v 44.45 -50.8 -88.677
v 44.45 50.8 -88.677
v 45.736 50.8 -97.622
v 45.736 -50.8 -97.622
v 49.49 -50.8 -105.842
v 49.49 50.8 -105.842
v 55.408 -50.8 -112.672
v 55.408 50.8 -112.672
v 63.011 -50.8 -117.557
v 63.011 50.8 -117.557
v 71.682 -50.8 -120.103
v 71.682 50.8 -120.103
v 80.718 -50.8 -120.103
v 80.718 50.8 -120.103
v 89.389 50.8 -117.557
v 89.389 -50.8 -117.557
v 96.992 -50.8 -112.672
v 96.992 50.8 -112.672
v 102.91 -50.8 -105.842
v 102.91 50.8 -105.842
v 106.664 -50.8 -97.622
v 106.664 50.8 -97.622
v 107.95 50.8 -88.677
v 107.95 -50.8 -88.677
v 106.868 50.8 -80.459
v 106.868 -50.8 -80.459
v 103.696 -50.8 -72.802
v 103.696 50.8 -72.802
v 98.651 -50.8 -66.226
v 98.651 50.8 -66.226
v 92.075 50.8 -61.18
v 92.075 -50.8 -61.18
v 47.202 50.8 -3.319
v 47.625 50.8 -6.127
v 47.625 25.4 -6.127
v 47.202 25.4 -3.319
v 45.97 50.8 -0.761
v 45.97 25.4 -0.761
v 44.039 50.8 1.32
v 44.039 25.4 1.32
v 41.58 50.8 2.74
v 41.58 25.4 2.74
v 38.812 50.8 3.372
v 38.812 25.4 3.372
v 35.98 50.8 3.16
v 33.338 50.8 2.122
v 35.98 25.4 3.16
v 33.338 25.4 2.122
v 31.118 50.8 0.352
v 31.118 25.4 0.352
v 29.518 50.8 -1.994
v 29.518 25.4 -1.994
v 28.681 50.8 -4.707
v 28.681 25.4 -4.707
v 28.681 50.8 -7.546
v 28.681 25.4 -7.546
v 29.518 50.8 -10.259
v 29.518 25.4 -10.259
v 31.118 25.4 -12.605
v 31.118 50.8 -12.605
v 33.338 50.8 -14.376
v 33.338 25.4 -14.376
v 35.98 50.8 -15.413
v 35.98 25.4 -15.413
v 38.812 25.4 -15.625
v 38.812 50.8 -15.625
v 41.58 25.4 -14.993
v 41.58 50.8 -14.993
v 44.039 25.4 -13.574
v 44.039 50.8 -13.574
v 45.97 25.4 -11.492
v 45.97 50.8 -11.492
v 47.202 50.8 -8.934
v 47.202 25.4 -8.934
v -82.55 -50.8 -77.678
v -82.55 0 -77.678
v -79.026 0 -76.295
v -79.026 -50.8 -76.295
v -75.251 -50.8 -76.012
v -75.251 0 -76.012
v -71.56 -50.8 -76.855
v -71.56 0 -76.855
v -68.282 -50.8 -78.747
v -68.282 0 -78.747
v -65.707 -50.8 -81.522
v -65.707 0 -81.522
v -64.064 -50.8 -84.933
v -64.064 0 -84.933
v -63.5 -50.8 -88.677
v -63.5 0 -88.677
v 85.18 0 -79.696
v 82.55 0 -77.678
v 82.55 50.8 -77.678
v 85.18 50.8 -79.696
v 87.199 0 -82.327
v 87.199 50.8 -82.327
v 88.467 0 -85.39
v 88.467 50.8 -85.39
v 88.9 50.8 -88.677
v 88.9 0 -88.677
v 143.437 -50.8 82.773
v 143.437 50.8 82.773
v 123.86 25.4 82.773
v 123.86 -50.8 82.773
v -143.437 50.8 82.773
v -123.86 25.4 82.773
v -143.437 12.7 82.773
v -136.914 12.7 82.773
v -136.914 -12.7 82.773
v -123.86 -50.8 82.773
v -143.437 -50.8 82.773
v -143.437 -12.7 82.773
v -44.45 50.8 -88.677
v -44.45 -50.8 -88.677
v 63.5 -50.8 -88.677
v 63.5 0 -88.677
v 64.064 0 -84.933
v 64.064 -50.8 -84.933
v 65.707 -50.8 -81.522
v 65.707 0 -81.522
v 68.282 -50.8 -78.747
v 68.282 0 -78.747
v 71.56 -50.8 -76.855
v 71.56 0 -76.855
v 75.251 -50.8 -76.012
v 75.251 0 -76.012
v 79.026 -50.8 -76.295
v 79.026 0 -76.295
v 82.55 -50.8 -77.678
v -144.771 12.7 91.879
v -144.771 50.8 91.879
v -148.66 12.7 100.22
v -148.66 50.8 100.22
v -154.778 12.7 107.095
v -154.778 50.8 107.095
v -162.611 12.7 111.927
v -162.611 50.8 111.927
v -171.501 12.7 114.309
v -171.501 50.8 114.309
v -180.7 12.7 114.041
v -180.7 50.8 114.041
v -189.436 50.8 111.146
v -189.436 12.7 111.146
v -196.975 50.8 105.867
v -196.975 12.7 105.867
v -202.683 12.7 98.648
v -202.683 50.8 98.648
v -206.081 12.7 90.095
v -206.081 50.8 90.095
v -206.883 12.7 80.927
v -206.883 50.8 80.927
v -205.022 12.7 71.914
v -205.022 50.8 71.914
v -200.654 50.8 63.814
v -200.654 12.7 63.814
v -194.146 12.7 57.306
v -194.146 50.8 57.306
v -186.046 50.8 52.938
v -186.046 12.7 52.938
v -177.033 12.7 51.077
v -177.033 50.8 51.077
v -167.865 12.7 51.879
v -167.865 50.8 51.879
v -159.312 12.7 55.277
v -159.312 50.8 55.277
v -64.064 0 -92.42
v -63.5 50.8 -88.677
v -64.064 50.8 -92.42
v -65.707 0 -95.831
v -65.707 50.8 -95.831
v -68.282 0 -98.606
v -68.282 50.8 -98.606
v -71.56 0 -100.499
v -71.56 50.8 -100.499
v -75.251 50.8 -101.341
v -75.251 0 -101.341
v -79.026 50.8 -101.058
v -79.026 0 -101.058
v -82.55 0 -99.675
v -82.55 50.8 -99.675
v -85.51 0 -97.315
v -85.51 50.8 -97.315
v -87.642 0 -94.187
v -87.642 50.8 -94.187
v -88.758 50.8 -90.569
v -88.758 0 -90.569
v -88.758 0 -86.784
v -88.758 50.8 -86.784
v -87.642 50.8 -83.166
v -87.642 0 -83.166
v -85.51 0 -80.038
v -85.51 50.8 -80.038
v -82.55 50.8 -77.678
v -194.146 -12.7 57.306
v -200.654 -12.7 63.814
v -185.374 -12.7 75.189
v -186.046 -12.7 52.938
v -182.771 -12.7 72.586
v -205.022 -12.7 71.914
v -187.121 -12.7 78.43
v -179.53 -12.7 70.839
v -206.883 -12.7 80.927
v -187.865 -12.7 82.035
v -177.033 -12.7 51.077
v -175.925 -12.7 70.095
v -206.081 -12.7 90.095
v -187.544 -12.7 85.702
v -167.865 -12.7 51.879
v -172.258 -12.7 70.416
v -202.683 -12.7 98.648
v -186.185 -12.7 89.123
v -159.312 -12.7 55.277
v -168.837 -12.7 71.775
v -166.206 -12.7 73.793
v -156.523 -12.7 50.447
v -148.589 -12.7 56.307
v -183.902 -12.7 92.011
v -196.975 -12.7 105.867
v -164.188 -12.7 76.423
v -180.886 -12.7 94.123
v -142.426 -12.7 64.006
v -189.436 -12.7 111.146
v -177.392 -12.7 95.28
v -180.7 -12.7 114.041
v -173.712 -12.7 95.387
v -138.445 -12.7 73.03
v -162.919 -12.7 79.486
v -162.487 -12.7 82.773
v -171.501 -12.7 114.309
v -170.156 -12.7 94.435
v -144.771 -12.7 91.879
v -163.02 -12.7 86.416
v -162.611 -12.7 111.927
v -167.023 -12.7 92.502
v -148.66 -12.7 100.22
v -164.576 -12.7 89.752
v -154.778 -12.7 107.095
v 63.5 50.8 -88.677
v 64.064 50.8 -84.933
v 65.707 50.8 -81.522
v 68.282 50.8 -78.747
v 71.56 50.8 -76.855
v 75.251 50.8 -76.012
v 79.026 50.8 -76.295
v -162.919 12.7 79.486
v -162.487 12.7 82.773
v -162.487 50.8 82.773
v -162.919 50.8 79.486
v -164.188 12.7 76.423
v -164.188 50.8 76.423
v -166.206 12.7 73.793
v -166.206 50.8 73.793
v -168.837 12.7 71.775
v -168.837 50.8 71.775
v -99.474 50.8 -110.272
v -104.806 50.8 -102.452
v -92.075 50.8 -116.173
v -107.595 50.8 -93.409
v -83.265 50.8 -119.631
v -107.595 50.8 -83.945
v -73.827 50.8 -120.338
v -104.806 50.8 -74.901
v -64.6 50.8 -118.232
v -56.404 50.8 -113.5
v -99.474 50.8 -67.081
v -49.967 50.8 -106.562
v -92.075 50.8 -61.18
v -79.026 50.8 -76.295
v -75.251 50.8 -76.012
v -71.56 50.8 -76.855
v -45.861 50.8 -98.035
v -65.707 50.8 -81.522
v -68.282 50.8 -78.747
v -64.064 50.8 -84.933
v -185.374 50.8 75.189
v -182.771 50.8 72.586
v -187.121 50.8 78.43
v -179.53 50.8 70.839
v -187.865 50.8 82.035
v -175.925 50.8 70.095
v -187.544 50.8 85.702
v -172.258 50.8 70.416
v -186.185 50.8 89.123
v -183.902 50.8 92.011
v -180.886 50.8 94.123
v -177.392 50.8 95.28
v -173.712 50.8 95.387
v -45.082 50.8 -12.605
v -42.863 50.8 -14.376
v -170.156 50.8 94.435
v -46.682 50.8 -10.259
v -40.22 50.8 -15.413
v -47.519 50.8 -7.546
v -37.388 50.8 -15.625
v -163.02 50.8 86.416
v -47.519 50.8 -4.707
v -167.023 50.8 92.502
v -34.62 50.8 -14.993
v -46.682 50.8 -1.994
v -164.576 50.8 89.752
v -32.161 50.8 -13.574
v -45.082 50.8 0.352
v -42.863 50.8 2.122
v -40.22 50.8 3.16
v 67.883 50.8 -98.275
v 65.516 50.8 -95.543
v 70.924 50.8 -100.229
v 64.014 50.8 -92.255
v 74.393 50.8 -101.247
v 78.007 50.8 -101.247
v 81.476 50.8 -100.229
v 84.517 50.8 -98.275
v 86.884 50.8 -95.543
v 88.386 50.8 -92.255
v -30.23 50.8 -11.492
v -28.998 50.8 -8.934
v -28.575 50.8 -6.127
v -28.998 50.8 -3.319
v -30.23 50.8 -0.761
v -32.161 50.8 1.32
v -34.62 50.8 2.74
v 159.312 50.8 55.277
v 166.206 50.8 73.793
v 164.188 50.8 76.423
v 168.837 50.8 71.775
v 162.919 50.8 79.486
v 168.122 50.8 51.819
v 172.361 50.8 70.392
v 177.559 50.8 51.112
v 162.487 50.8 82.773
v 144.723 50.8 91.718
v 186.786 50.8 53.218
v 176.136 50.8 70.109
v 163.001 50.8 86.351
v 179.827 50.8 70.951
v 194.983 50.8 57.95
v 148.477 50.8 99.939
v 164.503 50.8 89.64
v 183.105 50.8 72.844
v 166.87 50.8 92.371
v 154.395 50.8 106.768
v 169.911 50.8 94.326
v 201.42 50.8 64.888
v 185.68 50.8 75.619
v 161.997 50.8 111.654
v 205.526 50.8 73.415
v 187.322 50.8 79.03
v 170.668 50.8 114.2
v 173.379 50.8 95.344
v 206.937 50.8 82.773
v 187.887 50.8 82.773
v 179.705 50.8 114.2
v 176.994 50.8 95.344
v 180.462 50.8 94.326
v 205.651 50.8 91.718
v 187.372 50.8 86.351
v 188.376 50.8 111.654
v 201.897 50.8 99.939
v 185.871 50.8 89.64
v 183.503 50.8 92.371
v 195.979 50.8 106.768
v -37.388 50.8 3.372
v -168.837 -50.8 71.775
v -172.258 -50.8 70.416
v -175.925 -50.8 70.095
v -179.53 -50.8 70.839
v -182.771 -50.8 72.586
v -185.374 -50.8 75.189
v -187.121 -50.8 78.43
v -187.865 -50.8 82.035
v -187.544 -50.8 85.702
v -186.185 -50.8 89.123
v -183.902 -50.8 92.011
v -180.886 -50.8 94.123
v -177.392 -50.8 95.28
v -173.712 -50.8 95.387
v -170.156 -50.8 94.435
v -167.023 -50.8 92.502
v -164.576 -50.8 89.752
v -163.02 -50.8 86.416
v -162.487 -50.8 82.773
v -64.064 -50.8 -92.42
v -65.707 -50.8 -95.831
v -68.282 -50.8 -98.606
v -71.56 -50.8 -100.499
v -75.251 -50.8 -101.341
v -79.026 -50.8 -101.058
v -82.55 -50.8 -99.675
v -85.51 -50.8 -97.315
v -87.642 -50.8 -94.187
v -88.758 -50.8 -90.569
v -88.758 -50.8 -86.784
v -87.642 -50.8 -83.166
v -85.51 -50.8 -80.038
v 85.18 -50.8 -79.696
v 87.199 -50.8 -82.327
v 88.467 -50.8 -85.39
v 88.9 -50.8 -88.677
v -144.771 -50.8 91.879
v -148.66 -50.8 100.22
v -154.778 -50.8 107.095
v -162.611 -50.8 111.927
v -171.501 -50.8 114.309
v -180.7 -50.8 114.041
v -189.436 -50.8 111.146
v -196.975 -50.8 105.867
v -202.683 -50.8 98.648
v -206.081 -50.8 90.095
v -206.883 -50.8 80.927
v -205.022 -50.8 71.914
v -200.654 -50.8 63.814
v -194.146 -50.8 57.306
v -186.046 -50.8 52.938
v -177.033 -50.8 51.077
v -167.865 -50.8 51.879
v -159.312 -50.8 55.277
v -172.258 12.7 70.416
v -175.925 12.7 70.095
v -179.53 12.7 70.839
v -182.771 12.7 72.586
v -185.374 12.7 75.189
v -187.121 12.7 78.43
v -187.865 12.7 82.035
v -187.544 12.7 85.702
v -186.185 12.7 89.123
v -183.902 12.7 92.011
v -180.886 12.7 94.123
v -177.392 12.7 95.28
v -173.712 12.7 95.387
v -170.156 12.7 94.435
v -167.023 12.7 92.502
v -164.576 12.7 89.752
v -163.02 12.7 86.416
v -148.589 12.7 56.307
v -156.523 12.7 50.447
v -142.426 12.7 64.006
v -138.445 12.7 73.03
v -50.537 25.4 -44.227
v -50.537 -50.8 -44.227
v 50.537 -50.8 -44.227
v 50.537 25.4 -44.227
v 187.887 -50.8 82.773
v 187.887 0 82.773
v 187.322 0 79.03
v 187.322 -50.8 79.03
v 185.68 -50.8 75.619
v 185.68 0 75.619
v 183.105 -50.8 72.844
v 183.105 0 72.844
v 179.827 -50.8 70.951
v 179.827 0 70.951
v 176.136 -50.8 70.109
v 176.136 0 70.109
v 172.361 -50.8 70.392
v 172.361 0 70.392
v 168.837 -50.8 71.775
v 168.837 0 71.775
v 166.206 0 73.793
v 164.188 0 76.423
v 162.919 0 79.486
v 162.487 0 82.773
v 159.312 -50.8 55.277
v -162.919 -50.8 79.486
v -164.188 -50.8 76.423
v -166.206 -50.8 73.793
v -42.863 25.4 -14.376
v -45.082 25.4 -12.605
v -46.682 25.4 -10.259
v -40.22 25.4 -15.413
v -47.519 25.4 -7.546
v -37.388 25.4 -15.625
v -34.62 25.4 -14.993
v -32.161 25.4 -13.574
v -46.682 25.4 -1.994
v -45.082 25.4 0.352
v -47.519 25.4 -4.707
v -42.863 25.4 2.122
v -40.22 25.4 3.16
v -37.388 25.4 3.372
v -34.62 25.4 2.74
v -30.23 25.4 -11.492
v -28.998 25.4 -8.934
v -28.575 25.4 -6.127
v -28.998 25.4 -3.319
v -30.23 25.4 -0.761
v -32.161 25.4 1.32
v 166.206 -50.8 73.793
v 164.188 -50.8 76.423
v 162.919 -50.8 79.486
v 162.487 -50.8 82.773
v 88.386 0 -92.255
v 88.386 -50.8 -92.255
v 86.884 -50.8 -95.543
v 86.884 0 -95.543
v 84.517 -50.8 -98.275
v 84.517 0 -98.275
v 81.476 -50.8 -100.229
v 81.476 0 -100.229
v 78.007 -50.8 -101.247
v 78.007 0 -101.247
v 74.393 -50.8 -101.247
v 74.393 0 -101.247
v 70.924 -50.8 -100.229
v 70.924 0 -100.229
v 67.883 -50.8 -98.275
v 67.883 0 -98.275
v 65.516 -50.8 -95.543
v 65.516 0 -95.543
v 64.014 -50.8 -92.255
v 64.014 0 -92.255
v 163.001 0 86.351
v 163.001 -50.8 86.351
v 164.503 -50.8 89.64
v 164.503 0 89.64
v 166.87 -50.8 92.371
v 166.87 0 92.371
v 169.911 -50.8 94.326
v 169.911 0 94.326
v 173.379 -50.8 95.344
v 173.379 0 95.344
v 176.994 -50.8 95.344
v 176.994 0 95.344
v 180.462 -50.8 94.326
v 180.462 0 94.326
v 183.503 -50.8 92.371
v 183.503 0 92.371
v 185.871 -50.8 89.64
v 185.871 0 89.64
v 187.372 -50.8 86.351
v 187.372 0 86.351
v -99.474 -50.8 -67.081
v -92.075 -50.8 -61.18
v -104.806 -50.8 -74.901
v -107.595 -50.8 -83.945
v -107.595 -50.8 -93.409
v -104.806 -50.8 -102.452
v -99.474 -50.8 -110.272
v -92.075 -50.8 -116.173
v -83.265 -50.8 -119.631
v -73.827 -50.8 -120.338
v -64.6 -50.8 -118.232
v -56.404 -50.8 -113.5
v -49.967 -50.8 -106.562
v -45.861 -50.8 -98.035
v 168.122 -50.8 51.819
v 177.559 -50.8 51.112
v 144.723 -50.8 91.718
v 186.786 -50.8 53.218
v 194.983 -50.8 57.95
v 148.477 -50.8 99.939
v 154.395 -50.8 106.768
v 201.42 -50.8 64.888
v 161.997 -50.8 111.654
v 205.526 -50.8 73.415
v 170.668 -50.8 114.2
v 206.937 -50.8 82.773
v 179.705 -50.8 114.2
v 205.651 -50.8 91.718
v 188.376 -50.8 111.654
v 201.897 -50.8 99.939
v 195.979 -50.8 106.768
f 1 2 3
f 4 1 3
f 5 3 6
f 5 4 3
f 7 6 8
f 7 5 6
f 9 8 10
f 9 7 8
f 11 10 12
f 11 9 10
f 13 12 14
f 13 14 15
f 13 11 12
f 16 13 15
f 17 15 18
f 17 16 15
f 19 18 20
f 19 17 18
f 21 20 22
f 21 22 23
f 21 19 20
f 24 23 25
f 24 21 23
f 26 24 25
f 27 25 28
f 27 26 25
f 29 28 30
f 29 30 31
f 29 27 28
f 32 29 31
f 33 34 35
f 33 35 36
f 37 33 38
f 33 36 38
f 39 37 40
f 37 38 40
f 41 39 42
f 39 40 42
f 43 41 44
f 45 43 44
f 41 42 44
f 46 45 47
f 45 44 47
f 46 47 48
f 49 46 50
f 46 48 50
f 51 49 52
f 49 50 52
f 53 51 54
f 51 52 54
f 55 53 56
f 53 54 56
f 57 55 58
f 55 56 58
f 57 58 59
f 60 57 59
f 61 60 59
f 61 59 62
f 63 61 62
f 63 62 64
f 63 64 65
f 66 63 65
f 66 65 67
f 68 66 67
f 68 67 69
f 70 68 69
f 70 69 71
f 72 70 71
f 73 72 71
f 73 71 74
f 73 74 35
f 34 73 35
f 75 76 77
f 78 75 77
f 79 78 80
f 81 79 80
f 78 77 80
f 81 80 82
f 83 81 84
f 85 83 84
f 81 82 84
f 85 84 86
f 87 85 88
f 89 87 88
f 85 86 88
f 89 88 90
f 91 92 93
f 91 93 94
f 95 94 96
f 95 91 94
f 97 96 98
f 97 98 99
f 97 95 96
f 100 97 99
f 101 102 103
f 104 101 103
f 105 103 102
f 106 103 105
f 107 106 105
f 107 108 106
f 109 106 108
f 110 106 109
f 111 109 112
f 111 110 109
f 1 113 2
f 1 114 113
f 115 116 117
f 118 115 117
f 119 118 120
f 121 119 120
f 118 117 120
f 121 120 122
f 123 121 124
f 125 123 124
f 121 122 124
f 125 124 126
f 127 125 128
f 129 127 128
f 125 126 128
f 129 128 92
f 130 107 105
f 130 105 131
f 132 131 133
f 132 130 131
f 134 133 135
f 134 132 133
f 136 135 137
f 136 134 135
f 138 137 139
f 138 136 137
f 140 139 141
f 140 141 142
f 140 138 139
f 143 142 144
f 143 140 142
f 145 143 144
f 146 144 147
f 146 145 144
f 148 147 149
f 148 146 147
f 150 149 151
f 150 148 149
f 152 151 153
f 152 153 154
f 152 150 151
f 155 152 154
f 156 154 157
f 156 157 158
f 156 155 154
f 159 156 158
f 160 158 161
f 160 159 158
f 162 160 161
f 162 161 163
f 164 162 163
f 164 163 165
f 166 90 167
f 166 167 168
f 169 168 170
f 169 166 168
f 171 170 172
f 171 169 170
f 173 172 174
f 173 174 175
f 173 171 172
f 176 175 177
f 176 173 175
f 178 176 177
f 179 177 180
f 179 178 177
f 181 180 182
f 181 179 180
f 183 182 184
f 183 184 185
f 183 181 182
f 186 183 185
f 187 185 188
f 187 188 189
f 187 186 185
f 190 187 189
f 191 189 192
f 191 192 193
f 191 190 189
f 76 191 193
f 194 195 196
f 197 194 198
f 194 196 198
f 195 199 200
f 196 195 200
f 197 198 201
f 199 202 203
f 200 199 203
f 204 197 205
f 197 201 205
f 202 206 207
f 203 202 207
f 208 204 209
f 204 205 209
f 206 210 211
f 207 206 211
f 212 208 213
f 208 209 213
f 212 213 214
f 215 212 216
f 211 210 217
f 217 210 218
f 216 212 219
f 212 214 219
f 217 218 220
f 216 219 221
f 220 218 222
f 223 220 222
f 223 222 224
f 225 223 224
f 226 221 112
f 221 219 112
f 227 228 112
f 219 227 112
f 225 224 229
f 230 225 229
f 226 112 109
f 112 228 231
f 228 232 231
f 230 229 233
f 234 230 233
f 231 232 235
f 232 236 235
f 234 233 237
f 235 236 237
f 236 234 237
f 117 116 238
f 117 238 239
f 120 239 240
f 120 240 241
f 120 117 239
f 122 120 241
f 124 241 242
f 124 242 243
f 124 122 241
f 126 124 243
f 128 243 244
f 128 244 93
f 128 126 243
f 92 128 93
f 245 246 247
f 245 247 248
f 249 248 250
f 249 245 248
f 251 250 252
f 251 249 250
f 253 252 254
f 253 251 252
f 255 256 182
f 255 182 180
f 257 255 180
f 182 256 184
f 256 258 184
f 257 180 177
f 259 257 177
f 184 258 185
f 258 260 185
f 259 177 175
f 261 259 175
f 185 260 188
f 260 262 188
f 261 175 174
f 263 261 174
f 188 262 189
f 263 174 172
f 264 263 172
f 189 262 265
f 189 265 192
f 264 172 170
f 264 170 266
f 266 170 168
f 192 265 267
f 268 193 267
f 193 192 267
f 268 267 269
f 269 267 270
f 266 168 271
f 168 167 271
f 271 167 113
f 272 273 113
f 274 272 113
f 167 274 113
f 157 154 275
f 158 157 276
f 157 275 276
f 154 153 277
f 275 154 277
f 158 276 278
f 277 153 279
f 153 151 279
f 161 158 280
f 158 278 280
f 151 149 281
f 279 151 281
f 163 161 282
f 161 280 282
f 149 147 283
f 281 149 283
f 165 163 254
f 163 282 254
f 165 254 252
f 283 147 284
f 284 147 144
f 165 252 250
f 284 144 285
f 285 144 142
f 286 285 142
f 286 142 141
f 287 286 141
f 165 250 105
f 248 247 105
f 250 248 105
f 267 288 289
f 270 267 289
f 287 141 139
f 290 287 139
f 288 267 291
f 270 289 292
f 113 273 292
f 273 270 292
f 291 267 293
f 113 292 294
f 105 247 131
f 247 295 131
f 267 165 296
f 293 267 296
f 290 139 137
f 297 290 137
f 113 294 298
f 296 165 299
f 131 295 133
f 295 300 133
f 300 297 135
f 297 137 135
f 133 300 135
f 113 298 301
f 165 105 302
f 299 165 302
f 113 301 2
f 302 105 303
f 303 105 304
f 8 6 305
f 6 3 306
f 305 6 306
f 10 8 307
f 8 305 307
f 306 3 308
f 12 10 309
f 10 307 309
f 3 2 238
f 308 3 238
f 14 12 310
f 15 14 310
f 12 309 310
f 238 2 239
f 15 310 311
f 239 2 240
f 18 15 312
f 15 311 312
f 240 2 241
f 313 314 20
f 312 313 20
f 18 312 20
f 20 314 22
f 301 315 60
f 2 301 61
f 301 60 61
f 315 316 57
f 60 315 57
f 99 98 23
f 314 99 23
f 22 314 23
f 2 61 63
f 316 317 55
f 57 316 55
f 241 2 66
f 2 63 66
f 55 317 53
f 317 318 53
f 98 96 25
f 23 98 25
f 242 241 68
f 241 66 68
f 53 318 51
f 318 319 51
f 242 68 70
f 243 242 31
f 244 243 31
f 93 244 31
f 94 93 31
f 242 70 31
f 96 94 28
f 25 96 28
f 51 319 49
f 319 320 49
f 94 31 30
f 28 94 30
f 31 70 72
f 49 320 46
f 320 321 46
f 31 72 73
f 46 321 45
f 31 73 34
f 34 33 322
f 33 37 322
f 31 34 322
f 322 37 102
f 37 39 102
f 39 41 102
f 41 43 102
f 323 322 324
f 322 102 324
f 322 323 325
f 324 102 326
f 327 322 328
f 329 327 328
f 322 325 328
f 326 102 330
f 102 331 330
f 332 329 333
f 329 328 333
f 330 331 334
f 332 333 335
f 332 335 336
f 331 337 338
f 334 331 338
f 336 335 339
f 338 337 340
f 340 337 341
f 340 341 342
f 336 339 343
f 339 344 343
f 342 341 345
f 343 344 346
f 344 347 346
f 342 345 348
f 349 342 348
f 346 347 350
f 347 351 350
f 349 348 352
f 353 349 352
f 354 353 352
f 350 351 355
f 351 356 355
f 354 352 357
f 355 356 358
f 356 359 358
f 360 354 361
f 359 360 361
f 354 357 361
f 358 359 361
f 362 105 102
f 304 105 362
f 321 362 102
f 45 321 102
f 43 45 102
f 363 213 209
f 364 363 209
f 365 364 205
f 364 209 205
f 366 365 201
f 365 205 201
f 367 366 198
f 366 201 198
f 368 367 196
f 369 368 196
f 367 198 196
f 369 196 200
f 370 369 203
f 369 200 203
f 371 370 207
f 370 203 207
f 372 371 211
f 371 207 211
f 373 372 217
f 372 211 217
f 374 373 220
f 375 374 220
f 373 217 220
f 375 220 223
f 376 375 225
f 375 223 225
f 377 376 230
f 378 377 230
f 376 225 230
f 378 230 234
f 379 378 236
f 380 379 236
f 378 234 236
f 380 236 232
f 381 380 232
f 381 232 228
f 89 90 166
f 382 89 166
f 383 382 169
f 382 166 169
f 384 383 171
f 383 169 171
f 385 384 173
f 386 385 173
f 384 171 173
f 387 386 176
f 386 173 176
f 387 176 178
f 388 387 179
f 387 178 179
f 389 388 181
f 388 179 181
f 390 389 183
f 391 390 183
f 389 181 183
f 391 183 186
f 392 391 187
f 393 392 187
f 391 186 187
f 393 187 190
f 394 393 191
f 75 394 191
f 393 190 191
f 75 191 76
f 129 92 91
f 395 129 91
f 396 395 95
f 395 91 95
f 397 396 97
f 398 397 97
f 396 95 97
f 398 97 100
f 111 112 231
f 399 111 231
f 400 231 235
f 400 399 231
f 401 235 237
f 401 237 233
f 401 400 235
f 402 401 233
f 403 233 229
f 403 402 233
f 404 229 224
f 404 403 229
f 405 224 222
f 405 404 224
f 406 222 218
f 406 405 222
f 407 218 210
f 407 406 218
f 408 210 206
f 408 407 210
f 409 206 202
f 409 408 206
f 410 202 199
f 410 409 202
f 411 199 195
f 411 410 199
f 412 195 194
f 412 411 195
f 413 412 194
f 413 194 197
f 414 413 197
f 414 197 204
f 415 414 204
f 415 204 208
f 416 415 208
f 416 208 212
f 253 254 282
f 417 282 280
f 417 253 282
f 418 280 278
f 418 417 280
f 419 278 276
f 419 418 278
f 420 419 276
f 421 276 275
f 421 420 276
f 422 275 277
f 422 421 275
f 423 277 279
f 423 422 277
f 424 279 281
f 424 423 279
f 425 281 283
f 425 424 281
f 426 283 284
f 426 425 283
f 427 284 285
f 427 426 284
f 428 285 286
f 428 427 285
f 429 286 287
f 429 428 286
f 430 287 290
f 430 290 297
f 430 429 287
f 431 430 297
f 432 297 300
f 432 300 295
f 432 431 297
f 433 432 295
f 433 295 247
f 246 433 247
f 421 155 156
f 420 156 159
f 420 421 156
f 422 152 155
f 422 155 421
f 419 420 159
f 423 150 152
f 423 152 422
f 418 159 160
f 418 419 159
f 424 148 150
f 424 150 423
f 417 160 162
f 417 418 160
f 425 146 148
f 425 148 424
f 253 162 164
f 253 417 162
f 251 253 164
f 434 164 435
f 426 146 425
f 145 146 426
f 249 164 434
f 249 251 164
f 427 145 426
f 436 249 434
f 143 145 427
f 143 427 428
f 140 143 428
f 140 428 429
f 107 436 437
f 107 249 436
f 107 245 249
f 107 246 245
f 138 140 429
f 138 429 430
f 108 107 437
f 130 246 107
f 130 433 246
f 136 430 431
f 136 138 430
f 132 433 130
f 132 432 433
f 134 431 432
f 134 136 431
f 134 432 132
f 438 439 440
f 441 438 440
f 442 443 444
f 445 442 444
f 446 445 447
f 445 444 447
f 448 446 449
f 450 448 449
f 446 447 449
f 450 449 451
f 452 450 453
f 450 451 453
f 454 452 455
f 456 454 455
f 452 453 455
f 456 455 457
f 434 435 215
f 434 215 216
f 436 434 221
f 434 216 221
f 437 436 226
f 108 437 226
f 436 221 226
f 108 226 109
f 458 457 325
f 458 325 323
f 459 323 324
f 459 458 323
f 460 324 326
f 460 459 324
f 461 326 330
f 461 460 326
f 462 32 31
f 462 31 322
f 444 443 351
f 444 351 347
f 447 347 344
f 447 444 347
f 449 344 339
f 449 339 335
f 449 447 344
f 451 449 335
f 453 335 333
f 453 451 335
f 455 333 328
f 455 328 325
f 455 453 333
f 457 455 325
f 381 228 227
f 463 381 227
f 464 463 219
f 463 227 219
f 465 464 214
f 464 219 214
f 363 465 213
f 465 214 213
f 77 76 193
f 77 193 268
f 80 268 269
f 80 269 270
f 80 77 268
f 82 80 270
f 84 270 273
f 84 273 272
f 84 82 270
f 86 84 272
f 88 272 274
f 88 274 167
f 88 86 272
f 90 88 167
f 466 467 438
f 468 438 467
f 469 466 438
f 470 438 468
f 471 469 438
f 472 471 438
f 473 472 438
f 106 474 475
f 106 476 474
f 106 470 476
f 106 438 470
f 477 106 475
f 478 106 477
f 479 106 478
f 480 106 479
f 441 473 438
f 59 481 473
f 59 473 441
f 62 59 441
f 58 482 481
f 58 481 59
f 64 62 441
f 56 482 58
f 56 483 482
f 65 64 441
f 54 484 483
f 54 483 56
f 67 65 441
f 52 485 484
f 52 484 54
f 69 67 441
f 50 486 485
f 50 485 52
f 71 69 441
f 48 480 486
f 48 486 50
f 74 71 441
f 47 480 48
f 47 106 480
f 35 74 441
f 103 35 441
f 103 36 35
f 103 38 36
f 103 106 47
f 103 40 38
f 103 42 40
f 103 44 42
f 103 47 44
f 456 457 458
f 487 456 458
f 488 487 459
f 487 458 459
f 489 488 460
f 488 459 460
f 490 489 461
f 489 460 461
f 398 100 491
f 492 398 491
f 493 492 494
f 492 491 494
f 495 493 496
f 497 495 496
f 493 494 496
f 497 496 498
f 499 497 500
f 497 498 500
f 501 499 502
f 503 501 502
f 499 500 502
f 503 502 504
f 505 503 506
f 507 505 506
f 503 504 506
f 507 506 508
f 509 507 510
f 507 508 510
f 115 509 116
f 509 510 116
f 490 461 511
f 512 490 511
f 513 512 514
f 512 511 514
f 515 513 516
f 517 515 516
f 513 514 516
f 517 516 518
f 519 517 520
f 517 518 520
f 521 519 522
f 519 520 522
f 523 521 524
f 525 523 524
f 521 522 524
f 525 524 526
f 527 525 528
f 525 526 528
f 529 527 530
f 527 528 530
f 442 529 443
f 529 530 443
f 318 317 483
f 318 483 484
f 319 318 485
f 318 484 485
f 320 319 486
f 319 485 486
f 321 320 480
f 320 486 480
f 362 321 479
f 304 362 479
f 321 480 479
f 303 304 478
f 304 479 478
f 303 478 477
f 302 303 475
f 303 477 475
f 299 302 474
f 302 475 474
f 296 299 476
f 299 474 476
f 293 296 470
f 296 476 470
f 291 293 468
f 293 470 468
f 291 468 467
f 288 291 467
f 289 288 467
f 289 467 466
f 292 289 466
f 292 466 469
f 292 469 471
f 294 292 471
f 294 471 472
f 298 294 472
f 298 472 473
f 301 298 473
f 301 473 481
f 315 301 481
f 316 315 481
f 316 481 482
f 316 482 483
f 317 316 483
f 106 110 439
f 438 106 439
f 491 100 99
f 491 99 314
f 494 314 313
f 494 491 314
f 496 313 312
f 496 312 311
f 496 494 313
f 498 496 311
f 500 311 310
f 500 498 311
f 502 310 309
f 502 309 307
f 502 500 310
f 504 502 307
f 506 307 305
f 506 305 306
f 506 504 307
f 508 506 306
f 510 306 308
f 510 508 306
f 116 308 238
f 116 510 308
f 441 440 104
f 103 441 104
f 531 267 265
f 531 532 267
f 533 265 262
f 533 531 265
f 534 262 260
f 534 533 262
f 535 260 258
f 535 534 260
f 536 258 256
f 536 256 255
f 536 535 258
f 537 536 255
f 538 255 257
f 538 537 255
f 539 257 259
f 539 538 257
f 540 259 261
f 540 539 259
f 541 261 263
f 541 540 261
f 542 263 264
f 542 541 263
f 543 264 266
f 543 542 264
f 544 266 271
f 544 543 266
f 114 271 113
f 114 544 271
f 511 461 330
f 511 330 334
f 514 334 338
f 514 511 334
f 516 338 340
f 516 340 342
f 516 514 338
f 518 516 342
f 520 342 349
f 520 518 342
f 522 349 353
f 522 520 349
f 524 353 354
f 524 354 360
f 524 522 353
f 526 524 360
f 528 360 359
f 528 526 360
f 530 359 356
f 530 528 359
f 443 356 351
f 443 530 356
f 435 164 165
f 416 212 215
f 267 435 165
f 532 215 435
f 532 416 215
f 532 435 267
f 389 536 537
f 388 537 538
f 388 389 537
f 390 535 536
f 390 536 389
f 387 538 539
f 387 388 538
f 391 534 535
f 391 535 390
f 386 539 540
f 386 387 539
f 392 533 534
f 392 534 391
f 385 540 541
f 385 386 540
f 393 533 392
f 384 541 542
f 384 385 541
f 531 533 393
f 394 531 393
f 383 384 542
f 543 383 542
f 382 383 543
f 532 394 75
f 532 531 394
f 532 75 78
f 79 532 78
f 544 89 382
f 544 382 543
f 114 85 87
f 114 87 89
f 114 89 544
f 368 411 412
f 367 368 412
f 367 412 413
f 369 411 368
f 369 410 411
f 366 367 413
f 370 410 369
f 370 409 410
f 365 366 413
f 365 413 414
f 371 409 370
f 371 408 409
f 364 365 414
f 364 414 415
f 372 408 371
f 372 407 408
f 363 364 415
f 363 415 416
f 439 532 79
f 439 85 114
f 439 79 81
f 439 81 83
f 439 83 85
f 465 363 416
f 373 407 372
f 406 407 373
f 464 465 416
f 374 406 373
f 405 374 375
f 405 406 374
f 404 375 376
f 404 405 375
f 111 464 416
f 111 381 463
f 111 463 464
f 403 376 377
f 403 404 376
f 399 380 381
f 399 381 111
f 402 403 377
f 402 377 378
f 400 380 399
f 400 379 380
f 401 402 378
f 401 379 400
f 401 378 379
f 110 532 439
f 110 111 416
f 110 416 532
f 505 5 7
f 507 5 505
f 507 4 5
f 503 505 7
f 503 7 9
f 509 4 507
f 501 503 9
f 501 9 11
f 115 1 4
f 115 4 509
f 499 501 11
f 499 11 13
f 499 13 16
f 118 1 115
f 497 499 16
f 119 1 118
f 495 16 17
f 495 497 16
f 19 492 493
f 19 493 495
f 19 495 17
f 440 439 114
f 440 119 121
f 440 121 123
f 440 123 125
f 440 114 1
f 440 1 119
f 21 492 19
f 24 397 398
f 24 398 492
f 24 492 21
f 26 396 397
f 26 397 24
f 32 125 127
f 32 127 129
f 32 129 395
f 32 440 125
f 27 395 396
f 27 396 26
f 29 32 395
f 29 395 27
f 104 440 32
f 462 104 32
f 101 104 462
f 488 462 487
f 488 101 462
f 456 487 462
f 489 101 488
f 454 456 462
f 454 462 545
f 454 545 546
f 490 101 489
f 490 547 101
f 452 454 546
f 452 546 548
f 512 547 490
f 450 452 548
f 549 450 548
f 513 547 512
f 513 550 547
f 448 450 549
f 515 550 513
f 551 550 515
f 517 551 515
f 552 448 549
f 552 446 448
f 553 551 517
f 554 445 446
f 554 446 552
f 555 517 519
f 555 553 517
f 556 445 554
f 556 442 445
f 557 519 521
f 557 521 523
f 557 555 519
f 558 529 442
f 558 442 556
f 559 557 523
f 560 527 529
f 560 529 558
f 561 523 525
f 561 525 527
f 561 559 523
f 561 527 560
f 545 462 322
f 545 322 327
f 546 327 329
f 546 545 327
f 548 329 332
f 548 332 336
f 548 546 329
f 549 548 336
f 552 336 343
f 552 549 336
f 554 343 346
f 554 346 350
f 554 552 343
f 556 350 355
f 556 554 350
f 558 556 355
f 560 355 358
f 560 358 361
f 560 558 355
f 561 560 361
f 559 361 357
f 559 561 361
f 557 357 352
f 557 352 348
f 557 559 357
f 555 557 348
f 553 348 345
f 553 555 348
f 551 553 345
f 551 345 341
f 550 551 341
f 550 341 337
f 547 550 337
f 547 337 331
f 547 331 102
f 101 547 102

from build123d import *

# Parameters (mm, degrees)
F1_DEPTH = 50.8
F3_DEPTH = 76.2
F4_R     = 38.1
F5_DEPTH = 12.7
F6_R     = 9.525
F7_DEPTH = 25.401


with BuildPart() as f1:
    # F0 (on Front) → F1 (new body, symmetric)
    with BuildSketch(Plane.XZ):
        with BuildLine():
            ThreePointArc((-92.075, -61.1803239805), (-60.325, -61.1803239805), (-44.45, -88.6766305507))
            Line((-44.45, -88.6766305507), (44.45, -88.6766305507))
            ThreePointArc((44.45, -88.6766305507), (60.325, -61.1803239805), (92.075, -61.1803239805))
            Line((92.075, -61.1803239805), (159.3117036526, 55.2770628791))
            ThreePointArc((159.3117036526, 55.2770628791), (147.6903970824, 66.8983694493), (143.4367036526, 82.7733694493))
            Line((143.4367036526, 82.7733694493), (-143.4367036526, 82.7733694493))
            ThreePointArc((-143.4367036526, 82.7733694493), (-147.6903970824, 66.8983694493), (-159.3117036526, 55.2770628791))
            Line((-159.3117036526, 55.2770628791), (-92.075, -61.1803239805))
        make_face()
        with BuildLine():
            Line((-168.8367036526, 71.7748468212), (-159.3117036526, 55.2770628791))
            ThreePointArc((-159.3117036526, 55.2770628791), (-147.6903970824, 66.8983694493), (-143.4367036526, 82.7733694493))
            Line((-143.4367036526, 82.7733694493), (-162.4867036526, 82.7733694493))
            ThreePointArc((-162.4867036526, 82.7733694493), (-164.1881810245, 76.4233694493), (-168.8367036526, 71.7748468212))
        make_face()
        with BuildLine():
            ThreePointArc((-143.4367036526, 82.7733694493), (-202.6830102227, 98.6483694493), (-159.3117036526, 55.2770628791))
            Line((-159.3117036526, 55.2770628791), (-168.8367036526, 71.7748468212))
            ThreePointArc((-168.8367036526, 71.7748468212), (-186.1852262806, 89.1233694493), (-162.4867036526, 82.7733694493))
            Line((-162.4867036526, 82.7733694493), (-143.4367036526, 82.7733694493))
        make_face()
        with BuildLine():
            Line((168.8367036526, 71.7748468212), (159.3117036526, 55.2770628791))
            ThreePointArc((159.3117036526, 55.2770628791), (191.0617036526, 55.2770628791), (206.9367036526, 82.7733694493))
            ThreePointArc((206.9367036526, 82.7733694493), (175.1867036526, 114.5233694493), (143.4367036526, 82.7733694493))
            Line((143.4367036526, 82.7733694493), (162.4867036526, 82.7733694493))
            ThreePointArc((162.4867036526, 82.7733694493), (175.1867036526, 95.4733694493), (187.8867036526, 82.7733694493))
            ThreePointArc((187.8867036526, 82.7733694493), (181.5367036526, 71.7748468212), (168.8367036526, 71.7748468212))
        make_face()
        with BuildLine():
            ThreePointArc((143.4367036526, 82.7733694493), (147.6903970824, 66.8983694493), (159.3117036526, 55.2770628791))
            Line((159.3117036526, 55.2770628791), (168.8367036526, 71.7748468212))
            ThreePointArc((168.8367036526, 71.7748468212), (164.1881810245, 76.4233694493), (162.4867036526, 82.7733694493))
            Line((162.4867036526, 82.7733694493), (143.4367036526, 82.7733694493))
        make_face()
        with BuildLine():
            Line((63.5, -88.6766305507), (44.45, -88.6766305507))
            ThreePointArc((44.45, -88.6766305507), (76.2, -120.4266305507), (107.95, -88.6766305507))
            ThreePointArc((107.95, -88.6766305507), (103.6963065702, -72.8016305507), (92.075, -61.1803239805))
            Line((92.075, -61.1803239805), (82.55, -77.6781079226))
            ThreePointArc((82.55, -77.6781079226), (87.1985226281, -82.3266305507), (88.9, -88.6766305507))
            ThreePointArc((88.9, -88.6766305507), (76.2, -101.3766305507), (63.5, -88.6766305507))
        make_face()
        with BuildLine():
            ThreePointArc((92.075, -61.1803239805), (60.325, -61.1803239805), (44.45, -88.6766305507))
            Line((44.45, -88.6766305507), (63.5, -88.6766305507))
            ThreePointArc((63.5, -88.6766305507), (69.85, -77.6781079226), (82.55, -77.6781079226))
            Line((82.55, -77.6781079226), (92.075, -61.1803239805))
        make_face()
        with BuildLine():
            Line((-44.45, -88.6766305507), (-63.5, -88.6766305507))
            ThreePointArc((-63.5, -88.6766305507), (-82.55, -99.6751531788), (-82.55, -77.6781079226))
            Line((-82.55, -77.6781079226), (-92.075, -61.1803239805))
            ThreePointArc((-92.075, -61.1803239805), (-92.075, -116.1729371209), (-44.45, -88.6766305507))
        make_face()
        with BuildLine():
            ThreePointArc((-82.55, -77.6781079226), (-69.85, -77.6781079226), (-63.5, -88.6766305507))
            Line((-63.5, -88.6766305507), (-44.45, -88.6766305507))
            ThreePointArc((-44.45, -88.6766305507), (-60.325, -61.1803239805), (-92.075, -61.1803239805))
            Line((-92.075, -61.1803239805), (-82.55, -77.6781079226))
        make_face()
    extrude(amount=F1_DEPTH, both=True)

    # F2 (on face) → F3 (cut)
    with BuildSketch(Plane.XZ.offset(50.8)):
        Polygon((50.5367805345, -44.2266305507), (123.8602647216, 82.7733694493), (-123.8602647216, 82.7733694493), (-50.5367805345, -44.2266305507), align=None)
    extrude(amount=-F3_DEPTH, mode=Mode.SUBTRACT)

    # F4 (on Front) → F5 (cut, symmetric)
    with BuildSketch(Plane.XZ):
        with Locations((-175.0013381243, 83.766028285)):
            Circle(F4_R)
    extrude(amount=F5_DEPTH, both=True, mode=Mode.SUBTRACT)

    # F6 (on face) → F7 (cut, through all)
    with BuildSketch(Plane.XZ.offset(-25.4)):
        with Locations((-38.1, -6.1266305507)):
            Circle(F6_R)
        with Locations((38.1, -6.1266305507)):
            Circle(F6_R)
    extrude(amount=-F7_DEPTH, mode=Mode.SUBTRACT)


solid = f1.part
